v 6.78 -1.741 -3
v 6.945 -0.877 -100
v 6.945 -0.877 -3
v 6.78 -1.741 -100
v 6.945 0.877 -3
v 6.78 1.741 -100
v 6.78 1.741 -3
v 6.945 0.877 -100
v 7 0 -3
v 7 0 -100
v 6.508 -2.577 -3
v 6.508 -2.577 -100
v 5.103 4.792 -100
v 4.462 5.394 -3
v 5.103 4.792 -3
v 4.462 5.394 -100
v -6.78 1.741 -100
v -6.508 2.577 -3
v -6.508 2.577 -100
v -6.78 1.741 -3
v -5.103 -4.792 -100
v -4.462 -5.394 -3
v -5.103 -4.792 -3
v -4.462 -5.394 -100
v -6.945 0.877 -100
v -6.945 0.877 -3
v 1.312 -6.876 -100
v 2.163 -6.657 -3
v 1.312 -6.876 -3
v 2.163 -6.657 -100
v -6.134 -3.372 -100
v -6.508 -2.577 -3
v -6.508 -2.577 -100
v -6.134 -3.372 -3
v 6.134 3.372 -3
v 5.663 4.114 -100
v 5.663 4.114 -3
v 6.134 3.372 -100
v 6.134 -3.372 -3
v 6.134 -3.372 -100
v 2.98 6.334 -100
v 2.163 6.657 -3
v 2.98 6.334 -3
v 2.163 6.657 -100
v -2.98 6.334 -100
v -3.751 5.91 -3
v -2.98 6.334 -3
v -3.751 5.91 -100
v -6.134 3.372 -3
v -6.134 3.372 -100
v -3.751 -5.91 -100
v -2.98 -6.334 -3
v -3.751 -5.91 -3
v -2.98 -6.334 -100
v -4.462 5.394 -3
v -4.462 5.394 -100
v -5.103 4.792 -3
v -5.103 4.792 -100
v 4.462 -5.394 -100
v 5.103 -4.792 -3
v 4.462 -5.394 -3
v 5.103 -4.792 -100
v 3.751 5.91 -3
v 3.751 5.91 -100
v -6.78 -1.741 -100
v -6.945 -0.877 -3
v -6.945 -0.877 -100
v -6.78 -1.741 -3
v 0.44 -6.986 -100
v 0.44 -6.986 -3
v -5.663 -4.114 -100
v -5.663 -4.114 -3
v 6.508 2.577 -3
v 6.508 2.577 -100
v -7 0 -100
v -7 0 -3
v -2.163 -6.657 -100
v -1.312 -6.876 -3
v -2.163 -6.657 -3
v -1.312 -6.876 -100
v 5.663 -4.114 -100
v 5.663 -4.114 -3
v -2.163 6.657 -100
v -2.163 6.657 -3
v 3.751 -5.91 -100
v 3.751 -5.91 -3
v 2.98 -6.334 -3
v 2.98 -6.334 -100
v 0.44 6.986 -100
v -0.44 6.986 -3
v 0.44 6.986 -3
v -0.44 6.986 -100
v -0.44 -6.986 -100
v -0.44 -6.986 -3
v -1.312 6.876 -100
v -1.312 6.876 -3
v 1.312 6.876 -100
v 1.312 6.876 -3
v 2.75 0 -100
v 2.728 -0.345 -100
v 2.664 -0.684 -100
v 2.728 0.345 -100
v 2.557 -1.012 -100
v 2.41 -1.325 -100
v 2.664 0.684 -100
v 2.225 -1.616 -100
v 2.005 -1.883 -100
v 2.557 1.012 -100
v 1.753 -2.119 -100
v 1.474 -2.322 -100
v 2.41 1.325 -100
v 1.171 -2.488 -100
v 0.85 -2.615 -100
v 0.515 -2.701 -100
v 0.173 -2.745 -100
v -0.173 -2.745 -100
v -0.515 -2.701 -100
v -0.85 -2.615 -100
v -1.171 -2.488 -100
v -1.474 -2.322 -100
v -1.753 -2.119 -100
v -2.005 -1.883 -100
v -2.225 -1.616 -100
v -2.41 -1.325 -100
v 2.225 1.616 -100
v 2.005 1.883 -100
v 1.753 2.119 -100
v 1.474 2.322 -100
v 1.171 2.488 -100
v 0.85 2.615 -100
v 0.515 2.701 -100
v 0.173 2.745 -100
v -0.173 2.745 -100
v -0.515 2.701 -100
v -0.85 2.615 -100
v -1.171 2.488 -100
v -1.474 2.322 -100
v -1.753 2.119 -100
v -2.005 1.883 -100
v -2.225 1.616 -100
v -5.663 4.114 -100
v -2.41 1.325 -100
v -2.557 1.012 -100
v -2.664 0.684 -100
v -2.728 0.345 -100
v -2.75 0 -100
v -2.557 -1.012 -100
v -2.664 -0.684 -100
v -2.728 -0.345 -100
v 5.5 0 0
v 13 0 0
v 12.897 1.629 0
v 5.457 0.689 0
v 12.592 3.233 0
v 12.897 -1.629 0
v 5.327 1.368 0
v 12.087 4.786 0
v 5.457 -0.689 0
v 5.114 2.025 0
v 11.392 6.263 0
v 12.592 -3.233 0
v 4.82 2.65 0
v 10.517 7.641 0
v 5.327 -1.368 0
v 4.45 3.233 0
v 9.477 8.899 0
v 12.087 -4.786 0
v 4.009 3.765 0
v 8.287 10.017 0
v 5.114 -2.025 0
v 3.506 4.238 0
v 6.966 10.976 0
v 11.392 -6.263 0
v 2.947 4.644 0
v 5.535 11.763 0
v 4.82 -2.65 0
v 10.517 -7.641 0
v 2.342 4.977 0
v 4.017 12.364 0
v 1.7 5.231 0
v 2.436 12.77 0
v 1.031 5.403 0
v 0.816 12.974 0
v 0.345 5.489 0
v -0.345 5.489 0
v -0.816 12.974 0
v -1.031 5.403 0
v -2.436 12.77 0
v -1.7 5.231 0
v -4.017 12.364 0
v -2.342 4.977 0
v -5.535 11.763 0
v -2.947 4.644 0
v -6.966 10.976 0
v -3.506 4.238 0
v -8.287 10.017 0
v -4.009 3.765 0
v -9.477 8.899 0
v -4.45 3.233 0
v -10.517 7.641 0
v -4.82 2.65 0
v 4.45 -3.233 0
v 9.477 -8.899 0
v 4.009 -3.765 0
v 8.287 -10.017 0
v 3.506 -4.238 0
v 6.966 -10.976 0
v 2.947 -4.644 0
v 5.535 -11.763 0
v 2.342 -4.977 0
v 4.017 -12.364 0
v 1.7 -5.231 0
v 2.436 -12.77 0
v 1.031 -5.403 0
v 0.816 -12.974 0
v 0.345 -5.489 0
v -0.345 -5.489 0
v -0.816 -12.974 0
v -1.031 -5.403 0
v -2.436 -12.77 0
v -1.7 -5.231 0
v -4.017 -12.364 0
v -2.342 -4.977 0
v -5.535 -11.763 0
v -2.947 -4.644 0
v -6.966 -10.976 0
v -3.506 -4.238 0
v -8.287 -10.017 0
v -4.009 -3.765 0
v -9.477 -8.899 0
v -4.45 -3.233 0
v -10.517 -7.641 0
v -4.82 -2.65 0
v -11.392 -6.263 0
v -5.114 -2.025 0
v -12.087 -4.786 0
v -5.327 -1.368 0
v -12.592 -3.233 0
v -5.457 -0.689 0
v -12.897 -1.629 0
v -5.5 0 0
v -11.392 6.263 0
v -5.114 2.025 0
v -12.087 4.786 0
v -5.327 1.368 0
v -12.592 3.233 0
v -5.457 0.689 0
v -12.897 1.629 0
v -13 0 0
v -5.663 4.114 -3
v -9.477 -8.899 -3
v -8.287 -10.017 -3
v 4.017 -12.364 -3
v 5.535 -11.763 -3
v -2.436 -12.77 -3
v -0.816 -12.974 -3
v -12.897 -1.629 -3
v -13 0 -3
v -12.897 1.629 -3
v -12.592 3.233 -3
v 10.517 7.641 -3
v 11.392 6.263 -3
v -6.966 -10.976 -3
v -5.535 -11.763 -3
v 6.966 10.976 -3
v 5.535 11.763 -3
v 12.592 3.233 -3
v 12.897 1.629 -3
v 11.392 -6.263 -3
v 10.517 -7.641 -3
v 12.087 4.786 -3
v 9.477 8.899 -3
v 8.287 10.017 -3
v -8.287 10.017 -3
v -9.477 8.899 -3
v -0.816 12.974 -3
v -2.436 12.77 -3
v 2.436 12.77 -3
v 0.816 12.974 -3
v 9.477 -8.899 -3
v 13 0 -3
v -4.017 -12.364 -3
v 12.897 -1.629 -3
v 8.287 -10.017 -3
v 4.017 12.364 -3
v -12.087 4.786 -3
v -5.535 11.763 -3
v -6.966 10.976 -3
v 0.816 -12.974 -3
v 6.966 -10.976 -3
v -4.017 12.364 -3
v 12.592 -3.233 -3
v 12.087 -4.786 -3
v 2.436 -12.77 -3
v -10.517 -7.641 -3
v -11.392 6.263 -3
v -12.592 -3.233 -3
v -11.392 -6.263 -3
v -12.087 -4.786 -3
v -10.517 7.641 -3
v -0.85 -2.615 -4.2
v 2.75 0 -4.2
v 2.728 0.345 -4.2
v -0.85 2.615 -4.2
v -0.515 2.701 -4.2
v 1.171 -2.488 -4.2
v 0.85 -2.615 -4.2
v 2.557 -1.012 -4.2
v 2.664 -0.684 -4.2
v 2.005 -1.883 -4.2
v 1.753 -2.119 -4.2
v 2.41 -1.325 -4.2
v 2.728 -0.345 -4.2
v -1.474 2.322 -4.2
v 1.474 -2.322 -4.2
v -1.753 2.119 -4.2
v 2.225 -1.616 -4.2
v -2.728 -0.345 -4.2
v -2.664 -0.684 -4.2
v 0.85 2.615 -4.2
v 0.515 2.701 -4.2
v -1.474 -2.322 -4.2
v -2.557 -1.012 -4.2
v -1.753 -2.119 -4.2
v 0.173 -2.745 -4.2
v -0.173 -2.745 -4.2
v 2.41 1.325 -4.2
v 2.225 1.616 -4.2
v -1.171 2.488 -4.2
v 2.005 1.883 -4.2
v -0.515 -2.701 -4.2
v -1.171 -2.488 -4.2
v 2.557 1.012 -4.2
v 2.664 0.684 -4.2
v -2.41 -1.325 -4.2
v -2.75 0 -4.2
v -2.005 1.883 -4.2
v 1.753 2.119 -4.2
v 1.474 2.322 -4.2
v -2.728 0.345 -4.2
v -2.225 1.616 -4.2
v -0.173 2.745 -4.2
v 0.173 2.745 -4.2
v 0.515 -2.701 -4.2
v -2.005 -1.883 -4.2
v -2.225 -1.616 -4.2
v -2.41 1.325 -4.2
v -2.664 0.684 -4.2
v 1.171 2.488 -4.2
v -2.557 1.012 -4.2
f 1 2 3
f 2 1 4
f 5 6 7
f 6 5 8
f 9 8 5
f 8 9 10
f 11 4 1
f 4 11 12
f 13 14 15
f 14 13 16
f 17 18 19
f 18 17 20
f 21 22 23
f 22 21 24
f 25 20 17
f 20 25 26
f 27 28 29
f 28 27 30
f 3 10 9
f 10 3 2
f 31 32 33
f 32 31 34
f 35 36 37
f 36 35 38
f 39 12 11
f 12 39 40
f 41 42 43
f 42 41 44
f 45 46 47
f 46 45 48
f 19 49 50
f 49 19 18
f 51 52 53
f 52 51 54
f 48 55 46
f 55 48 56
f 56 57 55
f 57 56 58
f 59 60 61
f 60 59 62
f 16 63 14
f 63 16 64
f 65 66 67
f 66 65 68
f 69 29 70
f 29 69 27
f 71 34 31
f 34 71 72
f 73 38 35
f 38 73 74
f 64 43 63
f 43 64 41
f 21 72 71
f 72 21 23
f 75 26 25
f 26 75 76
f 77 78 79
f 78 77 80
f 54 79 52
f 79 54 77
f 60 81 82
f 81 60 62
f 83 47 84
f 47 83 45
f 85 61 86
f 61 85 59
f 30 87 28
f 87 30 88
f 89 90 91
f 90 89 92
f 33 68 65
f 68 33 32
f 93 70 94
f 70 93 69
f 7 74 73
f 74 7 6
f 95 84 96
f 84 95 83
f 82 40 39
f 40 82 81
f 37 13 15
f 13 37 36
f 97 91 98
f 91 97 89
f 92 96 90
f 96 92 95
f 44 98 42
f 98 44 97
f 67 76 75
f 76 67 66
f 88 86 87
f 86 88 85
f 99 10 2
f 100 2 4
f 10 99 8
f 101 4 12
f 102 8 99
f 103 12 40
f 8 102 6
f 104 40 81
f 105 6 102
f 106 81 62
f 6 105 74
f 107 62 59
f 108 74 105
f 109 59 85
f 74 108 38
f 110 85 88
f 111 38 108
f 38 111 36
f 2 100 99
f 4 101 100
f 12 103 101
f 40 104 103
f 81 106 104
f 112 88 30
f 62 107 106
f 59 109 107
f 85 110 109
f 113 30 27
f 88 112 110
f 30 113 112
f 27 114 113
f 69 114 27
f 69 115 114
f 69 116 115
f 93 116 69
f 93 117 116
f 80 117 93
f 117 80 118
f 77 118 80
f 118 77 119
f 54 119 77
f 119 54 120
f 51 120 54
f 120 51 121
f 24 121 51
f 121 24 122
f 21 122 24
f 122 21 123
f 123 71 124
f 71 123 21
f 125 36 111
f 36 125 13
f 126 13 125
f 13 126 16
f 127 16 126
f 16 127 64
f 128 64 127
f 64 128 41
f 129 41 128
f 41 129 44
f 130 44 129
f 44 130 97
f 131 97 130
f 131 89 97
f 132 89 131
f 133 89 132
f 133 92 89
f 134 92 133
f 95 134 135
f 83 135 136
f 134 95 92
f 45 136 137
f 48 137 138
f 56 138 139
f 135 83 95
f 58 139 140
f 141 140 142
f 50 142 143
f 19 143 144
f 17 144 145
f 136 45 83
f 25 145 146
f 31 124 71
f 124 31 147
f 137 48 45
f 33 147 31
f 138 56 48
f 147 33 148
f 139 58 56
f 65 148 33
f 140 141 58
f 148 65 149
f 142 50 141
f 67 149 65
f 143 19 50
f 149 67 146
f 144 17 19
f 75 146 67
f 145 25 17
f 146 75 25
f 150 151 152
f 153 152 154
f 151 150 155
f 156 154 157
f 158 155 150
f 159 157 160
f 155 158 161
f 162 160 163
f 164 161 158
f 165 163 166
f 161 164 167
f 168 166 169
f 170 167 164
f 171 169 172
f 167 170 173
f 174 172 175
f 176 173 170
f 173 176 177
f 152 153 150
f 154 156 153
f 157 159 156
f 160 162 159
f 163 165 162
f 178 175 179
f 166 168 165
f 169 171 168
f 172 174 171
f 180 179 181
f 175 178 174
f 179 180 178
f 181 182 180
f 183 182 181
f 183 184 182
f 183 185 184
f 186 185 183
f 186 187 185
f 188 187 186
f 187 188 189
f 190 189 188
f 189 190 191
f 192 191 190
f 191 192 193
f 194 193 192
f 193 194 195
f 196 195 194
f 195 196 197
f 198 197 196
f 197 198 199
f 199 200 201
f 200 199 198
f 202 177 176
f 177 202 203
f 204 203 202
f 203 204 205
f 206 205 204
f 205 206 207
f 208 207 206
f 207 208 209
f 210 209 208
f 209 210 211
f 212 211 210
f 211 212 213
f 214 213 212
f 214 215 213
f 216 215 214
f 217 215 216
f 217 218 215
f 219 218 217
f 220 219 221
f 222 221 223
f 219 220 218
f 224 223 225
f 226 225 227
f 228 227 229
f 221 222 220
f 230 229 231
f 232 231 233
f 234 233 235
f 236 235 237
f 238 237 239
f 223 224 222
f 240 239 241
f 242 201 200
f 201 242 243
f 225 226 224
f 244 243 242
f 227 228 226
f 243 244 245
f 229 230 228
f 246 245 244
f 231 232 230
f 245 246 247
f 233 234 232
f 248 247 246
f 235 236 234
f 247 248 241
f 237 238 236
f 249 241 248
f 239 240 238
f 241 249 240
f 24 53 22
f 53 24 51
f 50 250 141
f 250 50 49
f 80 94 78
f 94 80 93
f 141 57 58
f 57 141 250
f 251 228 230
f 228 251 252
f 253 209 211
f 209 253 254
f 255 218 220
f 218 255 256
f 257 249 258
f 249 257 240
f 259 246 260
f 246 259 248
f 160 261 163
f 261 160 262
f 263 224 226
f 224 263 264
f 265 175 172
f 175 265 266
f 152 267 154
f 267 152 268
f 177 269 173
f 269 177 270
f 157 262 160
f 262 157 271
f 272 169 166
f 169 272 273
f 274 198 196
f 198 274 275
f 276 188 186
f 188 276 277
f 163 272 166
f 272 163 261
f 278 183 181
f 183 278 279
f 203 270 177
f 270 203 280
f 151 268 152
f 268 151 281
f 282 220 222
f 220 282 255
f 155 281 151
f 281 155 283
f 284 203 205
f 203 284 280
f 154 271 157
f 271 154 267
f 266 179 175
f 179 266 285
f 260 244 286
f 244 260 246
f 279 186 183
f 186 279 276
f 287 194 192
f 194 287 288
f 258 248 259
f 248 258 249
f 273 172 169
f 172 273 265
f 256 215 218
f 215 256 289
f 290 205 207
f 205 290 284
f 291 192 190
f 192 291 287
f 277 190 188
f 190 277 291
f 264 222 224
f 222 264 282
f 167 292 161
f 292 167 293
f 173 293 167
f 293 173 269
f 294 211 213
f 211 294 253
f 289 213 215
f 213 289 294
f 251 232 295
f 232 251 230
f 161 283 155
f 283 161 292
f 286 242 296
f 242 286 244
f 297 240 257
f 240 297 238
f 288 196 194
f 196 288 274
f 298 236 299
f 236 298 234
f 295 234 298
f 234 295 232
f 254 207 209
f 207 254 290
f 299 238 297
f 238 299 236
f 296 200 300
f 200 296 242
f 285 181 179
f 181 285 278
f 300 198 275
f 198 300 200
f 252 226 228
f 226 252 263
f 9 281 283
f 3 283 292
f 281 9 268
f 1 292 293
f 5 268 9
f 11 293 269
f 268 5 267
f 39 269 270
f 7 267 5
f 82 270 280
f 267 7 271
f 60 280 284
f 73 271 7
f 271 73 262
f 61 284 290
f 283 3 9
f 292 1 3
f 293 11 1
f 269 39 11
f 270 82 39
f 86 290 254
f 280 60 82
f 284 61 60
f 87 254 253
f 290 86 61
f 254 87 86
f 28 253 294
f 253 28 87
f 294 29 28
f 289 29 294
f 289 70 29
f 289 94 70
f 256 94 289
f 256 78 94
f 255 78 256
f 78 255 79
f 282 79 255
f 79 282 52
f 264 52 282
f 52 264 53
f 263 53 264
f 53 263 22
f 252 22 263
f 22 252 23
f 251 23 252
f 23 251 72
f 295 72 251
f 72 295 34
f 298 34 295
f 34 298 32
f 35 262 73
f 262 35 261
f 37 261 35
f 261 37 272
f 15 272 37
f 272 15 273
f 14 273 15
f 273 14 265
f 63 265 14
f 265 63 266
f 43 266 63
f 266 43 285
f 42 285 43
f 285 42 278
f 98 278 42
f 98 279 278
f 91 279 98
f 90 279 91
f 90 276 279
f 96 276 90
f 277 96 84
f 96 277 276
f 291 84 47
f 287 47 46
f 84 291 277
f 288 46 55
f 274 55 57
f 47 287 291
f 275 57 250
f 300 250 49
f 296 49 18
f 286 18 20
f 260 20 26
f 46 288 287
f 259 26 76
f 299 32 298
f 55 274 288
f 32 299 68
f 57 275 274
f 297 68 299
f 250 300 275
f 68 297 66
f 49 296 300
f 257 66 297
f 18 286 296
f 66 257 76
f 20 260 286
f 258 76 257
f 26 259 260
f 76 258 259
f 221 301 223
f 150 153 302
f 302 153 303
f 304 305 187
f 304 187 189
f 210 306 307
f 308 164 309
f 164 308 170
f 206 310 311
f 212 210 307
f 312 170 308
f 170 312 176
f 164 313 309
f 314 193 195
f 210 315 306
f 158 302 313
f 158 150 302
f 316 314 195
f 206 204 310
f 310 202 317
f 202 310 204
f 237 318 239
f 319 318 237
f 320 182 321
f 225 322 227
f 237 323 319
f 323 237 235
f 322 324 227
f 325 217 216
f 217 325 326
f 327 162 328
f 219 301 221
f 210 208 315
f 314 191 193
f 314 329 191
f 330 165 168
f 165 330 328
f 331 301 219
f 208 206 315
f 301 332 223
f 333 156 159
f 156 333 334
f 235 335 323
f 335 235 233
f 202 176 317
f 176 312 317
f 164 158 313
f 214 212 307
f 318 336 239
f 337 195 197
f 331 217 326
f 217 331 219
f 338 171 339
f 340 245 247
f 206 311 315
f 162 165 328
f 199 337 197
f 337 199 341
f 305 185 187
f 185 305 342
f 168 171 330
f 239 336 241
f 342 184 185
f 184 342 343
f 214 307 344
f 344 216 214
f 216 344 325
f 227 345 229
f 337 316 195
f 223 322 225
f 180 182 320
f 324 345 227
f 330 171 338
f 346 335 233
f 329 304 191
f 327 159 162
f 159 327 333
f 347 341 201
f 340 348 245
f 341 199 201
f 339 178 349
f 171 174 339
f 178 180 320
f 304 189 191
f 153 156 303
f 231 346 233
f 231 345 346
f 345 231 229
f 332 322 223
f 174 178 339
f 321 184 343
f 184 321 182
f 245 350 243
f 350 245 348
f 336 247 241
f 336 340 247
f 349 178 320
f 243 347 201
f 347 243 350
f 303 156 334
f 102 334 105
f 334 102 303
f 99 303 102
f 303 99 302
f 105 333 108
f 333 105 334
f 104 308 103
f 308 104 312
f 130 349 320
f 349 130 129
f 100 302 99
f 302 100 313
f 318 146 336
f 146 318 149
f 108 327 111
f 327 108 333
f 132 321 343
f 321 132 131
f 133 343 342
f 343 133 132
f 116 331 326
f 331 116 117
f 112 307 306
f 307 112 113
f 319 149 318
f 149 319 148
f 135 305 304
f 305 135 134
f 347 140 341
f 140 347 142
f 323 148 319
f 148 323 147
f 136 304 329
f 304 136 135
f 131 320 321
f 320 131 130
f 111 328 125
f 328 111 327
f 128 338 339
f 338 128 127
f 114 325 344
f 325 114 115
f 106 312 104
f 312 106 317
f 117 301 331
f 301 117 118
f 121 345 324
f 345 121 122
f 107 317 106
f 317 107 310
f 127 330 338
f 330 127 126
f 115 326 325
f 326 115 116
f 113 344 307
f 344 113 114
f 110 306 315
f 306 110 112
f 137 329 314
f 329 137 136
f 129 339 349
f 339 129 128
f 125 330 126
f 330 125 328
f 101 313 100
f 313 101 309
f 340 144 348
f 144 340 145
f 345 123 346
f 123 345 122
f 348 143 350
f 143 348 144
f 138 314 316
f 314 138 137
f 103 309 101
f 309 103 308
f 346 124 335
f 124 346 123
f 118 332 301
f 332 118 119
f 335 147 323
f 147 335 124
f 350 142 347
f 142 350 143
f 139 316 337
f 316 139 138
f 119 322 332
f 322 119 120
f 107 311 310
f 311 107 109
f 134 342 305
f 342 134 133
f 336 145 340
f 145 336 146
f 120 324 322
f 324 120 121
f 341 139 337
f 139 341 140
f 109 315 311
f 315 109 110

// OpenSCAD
$fn = 50;


difference() {
	union() {
		translate(v = [0, 0, -100.0000000000]) {
			cylinder(h = 100, r = 7.0000000000);
		}
		translate(v = [0, 0, -3.0000000000]) {
			cylinder(h = 3, r = 13.0000000000);
		}
	}
	union() {
		translate(v = [0, 0, 0]) {
			rotate(a = [0, 0, 0]) {
				difference() {
					union() {
						#translate(v = [0, 0, -100.0000000000]) {
							cylinder(h = 100, r = 2.2500000000);
						}
						#translate(v = [0, 0, -4.2000000000]) {
							cylinder(h = 4.2000000000, r = 7.0000000000, r1 = 2.7500000000, r2 = 5.5000000000);
						}
						#translate(v = [0, 0, -100.0000000000]) {
							cylinder(h = 100, r = 2.7500000000);
						}
						#translate(v = [0, 0, -100.0000000000]) {
							cylinder(h = 100, r = 2.2500000000);
						}
					}
					union();
				}
			}
		}
	}
}
